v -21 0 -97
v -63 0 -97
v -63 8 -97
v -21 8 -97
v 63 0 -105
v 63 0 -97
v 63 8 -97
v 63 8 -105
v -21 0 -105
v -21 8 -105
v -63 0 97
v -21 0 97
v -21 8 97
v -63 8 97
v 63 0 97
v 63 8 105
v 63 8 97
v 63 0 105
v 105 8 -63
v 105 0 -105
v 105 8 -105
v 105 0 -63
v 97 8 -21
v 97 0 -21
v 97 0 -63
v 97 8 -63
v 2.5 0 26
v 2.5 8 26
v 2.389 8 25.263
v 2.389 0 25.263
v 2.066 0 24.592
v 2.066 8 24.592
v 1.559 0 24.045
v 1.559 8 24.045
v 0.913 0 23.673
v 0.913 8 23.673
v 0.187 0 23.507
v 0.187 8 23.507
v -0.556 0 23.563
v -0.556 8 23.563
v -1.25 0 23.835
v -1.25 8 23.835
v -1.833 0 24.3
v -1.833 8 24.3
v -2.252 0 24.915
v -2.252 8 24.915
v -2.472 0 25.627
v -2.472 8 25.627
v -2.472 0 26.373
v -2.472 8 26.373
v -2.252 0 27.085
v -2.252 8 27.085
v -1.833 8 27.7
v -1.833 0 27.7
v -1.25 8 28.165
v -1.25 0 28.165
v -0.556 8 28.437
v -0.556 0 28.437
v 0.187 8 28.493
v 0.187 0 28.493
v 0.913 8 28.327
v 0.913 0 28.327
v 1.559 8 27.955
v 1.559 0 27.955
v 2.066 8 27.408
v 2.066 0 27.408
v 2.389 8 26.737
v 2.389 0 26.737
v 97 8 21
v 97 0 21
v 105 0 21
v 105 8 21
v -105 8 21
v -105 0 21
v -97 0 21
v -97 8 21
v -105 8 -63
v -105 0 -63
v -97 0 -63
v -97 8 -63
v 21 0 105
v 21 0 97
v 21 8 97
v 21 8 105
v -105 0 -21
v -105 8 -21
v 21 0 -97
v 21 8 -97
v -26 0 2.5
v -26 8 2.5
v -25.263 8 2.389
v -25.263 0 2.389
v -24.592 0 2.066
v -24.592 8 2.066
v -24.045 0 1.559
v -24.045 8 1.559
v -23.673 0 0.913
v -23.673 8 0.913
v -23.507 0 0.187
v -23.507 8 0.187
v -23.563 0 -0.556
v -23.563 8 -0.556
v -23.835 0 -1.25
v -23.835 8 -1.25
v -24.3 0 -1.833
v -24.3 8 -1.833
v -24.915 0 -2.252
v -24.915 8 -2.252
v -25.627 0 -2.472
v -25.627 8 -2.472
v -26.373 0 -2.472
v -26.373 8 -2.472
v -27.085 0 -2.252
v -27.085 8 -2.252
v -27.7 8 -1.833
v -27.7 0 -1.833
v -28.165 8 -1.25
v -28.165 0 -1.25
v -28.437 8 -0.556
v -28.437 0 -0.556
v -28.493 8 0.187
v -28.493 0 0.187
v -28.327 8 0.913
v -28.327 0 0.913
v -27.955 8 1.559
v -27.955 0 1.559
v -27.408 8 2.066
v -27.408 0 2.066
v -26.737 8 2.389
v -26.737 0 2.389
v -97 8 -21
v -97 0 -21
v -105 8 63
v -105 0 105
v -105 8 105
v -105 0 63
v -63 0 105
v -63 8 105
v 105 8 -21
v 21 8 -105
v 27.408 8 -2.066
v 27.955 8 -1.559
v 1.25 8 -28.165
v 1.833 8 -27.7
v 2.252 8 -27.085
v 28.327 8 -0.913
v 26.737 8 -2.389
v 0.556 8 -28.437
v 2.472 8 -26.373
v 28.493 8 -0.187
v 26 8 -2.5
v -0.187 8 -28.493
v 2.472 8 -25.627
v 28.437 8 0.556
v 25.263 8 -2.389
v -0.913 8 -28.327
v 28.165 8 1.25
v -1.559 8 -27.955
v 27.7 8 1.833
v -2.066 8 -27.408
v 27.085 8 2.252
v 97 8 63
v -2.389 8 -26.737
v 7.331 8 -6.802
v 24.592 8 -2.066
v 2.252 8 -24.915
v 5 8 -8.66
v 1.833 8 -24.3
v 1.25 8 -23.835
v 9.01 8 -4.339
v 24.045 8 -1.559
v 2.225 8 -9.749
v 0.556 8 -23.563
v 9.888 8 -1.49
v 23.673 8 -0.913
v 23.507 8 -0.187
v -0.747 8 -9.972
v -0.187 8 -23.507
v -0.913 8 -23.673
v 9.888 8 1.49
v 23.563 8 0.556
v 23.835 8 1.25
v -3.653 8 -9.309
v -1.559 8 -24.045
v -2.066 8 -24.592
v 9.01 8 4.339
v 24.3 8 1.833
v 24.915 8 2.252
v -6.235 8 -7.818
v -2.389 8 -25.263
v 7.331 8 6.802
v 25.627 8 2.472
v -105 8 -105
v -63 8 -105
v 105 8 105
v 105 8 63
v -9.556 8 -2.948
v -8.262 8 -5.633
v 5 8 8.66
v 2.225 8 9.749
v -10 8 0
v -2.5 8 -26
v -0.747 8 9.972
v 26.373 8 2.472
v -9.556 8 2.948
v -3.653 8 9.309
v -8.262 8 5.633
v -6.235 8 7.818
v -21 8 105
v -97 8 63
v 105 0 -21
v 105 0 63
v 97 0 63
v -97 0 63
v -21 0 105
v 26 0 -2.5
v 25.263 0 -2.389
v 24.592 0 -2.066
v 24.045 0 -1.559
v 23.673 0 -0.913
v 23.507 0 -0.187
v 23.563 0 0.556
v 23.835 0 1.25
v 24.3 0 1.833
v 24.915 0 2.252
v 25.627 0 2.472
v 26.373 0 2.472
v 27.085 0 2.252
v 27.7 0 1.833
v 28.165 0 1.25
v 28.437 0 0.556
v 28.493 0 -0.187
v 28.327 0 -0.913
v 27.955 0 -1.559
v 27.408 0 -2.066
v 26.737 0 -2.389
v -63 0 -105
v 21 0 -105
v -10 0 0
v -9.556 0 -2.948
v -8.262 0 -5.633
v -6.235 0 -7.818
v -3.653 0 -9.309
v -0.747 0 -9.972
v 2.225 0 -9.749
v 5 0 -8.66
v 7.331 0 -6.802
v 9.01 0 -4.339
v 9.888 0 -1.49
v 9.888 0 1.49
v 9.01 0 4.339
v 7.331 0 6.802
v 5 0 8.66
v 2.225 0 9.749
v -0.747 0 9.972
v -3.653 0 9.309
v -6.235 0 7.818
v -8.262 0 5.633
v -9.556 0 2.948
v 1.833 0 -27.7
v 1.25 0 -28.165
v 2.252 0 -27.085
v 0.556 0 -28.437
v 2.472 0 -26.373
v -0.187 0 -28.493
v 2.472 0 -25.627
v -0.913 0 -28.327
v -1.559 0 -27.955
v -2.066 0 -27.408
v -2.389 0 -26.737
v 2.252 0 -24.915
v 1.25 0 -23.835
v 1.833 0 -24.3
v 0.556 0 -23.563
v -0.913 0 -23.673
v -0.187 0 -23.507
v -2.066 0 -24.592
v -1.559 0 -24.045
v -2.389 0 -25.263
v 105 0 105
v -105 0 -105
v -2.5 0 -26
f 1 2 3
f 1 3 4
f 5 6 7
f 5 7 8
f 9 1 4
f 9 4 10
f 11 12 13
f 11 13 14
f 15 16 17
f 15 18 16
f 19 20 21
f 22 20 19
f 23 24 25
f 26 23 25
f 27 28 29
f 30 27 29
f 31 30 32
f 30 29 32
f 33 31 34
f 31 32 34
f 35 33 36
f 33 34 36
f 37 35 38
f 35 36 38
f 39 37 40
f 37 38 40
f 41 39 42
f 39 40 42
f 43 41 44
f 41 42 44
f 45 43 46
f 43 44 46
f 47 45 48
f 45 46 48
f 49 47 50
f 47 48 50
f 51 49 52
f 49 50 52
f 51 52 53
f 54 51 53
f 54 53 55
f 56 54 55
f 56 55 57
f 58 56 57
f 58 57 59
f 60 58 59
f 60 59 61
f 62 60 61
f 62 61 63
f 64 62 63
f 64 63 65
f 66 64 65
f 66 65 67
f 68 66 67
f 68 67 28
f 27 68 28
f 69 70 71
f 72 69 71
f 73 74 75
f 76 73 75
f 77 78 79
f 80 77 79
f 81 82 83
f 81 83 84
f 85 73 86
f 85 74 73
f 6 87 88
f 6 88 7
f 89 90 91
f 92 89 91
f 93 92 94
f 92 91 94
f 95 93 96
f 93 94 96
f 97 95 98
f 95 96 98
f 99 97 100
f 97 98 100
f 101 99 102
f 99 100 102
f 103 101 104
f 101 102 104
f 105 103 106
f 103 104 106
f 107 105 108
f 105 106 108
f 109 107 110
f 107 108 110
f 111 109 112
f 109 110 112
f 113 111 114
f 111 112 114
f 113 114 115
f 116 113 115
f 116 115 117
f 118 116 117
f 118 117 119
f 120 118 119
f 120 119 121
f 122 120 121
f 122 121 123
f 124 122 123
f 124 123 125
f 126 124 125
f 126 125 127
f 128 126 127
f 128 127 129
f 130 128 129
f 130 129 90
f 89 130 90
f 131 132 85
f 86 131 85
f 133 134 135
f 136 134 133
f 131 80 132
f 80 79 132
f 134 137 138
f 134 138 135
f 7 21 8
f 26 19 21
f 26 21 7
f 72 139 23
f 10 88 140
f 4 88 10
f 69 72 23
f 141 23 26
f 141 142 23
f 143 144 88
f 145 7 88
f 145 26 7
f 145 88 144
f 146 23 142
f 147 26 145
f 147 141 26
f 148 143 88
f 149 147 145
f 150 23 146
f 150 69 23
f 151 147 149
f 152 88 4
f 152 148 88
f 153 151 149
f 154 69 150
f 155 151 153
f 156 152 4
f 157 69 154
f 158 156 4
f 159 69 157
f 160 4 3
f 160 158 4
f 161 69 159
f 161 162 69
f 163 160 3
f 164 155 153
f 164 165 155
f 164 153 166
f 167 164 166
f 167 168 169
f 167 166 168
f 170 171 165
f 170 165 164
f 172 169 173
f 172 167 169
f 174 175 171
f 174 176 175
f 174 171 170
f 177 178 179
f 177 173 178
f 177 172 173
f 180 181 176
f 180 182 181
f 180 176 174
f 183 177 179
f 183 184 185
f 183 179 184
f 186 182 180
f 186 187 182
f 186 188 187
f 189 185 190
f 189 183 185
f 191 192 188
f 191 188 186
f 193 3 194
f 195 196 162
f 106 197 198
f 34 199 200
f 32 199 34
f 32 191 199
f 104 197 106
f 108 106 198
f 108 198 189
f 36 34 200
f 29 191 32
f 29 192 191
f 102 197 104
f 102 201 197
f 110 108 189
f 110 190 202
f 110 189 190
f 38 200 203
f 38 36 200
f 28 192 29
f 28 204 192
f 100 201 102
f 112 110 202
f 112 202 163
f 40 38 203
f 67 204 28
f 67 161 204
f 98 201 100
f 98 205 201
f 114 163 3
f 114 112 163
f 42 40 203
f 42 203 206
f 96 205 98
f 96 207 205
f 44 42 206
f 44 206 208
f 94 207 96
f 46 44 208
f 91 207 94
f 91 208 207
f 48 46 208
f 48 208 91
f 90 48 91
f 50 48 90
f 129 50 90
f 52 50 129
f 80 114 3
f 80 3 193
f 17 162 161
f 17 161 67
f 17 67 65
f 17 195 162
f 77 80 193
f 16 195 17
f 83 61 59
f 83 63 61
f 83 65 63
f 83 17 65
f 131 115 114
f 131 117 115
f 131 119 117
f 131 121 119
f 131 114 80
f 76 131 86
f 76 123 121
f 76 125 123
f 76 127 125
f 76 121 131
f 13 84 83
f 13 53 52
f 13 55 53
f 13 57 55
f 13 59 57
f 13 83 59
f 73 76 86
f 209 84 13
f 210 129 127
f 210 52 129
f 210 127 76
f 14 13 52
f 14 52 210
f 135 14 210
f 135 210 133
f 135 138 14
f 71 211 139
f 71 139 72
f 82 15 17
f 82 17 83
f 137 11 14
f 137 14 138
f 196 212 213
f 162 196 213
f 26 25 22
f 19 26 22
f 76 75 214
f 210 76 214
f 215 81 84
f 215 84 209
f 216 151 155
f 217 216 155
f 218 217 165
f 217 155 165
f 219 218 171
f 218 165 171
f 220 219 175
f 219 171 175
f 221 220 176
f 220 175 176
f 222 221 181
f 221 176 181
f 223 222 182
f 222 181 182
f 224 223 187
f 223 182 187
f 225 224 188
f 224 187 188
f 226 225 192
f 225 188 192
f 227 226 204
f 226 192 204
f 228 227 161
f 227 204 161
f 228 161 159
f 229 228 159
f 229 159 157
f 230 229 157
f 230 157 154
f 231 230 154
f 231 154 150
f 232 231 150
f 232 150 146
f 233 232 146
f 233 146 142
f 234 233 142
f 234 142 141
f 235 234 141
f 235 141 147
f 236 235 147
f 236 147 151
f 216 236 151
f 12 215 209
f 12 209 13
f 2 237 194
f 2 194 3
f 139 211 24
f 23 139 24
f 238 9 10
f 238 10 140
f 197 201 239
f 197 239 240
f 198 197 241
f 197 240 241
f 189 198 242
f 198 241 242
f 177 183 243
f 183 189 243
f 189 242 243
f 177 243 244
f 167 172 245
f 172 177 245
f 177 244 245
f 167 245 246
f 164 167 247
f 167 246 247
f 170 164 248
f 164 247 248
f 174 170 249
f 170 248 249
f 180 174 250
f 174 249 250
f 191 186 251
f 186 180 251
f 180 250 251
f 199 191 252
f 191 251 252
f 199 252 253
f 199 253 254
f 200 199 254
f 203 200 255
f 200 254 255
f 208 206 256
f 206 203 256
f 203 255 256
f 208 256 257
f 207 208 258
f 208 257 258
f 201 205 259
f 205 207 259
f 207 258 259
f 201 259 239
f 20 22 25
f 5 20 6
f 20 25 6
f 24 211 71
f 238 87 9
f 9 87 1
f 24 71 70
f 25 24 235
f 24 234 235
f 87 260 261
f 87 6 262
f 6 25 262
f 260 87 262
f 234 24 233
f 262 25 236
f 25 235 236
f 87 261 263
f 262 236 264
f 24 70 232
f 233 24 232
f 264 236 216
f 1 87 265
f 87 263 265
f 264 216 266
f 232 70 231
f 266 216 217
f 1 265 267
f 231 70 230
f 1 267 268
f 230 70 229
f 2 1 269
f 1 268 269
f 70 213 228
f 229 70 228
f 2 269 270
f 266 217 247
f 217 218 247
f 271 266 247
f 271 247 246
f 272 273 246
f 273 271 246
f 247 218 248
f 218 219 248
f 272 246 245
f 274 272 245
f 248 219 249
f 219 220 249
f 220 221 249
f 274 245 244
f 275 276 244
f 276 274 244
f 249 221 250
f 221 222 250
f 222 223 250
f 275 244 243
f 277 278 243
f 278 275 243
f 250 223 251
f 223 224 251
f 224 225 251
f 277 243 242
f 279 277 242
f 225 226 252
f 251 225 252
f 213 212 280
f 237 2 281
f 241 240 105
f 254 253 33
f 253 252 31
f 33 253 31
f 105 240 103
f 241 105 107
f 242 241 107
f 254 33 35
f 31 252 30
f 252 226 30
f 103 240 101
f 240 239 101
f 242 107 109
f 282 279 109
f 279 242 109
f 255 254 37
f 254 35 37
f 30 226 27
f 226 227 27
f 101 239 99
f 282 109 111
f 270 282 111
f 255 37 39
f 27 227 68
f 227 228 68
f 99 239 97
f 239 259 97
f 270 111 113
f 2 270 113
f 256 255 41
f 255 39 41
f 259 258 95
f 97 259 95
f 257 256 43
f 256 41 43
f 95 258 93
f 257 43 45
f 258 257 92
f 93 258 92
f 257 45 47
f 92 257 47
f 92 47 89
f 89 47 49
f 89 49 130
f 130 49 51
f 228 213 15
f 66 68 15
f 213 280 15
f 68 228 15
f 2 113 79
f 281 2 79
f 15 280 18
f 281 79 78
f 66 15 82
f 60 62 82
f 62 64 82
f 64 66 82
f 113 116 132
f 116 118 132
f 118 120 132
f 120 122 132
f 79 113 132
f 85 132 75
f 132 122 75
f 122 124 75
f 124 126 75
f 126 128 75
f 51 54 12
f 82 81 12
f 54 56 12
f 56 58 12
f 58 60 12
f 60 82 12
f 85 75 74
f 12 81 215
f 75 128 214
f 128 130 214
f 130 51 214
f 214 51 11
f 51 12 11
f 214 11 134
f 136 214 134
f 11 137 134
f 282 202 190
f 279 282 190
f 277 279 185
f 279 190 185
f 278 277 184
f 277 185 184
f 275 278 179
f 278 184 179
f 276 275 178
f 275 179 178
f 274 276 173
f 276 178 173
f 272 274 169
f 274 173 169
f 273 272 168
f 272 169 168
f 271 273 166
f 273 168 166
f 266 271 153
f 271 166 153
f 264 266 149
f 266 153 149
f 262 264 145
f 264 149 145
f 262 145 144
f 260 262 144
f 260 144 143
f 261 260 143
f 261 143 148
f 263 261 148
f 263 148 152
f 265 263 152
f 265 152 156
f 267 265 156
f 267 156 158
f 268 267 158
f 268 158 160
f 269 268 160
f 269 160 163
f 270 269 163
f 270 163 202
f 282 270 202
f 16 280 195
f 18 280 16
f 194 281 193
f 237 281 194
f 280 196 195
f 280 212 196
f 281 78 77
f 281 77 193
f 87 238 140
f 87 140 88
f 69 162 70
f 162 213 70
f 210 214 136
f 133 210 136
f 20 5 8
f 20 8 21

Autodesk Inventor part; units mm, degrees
ref_plane "YZ Plane" through (0, 0, 0) normal (1, 0, 0) x (0, 1, 0)
ref_plane "XZ Plane" through (0, 0, 0) normal (0, 1, 0) x (-1, 0, 0)
ref_plane "XY Plane" through (0, 0, 0) normal (0, 0, 1) x (1, 0, 0)
sketch "Sketch2" plane through (0, 0, 0) normal (0, 1, 0) x (-1, 0, 0)
  line L0 (-105, 105) -> (105, 105)
  line L1 (105, 105) -> (105, -105)
  line L2 (105, -105) -> (-105, -105)
  line L3 (-105, -105) -> (-105, 105)
  line L4 (-105, 105) -> (105, -105) construction
  line L5 (105, 105) -> (-105, -105) construction
  circle A0 centre (0, 0) radius 10
  dimension "d11" = 210
  dimension "d12" = 210
  dimension "d13" = 20
extrude "Extrusion2" add sketch "Sketch2" along normal blind 8
sketch "Sketch3" plane through (0, 0, 0) normal (0, -1, 0) x (1, 0, 0)
  point P0 (0, 0)
  point P1 (26, 0)
  dimension "d16" = 26
hole "Hole1" at (26, 0, 0) direction (0, 1, 0) diameter 5 depth 8 tip angle 118
pattern_circular "Circular Pattern1" count 4 over 360 about axis through (0, 0, 0) along (0, 1, 0) of "Hole1"
sketch "Sketch4" plane through (0, 0, 0) normal (0, -1, 0) x (1, 0, 0)
  circle A0 centre (0, 26) radius 2.5 projected
  circle A1 centre (-26, 0) radius 2.5 projected
  circle A2 centre (0, -26) radius 2.5 projected
  circle A3 centre (26, 0) radius 2.5 projected
  circle A4 centre (0, 0) radius 10 projected
  line L0 (105, 105) -> (-105, 105) projected
  line L1 (-105, 105) -> (-105, -105) projected
  line L2 (-105, -105) -> (105, -105) projected
  line L3 (105, -105) -> (105, 105) projected
  line L4 (-105, -63) -> (-97, -63)
  line L5 (-97, -63) -> (-97, -21)
  line L6 (-97, -21) -> (-105, -21)
  line L7 (-105, -21) -> (-105, -63)
  line L8 (-105, 21) -> (-97, 21)
  line L9 (-97, 21) -> (-97, 63)
  line L10 (-97, 63) -> (-105, 63)
  line L11 (-105, 63) -> (-105, 21)
  line L12 (-97, -21) -> (-97, 21) construction
  line L13 (-97, 63) -> (-97, 105) construction
  line L14 (-97, -63) -> (-97, -105)
  dimension "d27" = 8
extrude "Extrusion3" cut sketch "Sketch4" against normal through all contours L10 L9 L8 L1 | L4 L1 L6 L5
sketch "Sketch5" plane through (0, 0, 0) normal (0, -1, 0) x (1, 0, 0)
  line L0 (-97, 21) -> (-105, 21) projected
  line L1 (-105, 21) -> (-105, -21) projected
  line L2 (-105, -21) -> (-97, -21) projected
  line L3 (-97, -21) -> (-97, -63) projected
  line L4 (-97, -63) -> (-105, -63) projected
  line L5 (-105, -63) -> (-105, -105) projected
  line L6 (-105, -105) -> (105, -105) projected
  line L7 (105, -105) -> (105, 105) projected
  line L8 (105, 105) -> (-105, 105) projected
  line L9 (-105, 105) -> (-105, 63) projected
  line L10 (-105, 63) -> (-97, 63) projected
  line L11 (-97, 63) -> (-97, 21) projected
  circle A0 centre (0, 26) radius 2.5 projected
  circle A1 centre (-26, 0) radius 2.5 projected
  circle A2 centre (0, -26) radius 2.5 projected
  circle A3 centre (26, 0) radius 2.5 projected
  circle A4 centre (0, 0) radius 10 projected
  line L12 (63, -105) -> (21, -105)
  line L13 (21, -105) -> (21, -97)
  line L14 (21, -97) -> (63, -97)
  line L15 (63, -97) -> (63, -105)
  line L16 (-21, -105) -> (-63, -105)
  line L17 (-63, -105) -> (-63, -97)
  line L18 (-63, -97) -> (-21, -97)
  line L19 (-21, -97) -> (-21, -105)
  line L20 (63, -97) -> (105, -97) construction
  line L21 (21, -97) -> (-21, -97) construction
  line L22 (-63, -97) -> (-105, -97) construction
  dimension "d31" = 8
extrude "Extrusion4" cut sketch "Sketch5" against normal through all contours L6 L13 L14 L15 | L17 L18 L19 L6
mirror "Mirror1" about plane through (0, 0, 0) normal (1, 0, 0) of "Extrusion3"
mirror "Mirror2" about plane through (0, 0, 0) normal (0, 0, 1) of "Extrusion4"
equation "\"d11\" = d12"
properties part number "M01 - Base Top" material "Wood (Walnut)"
